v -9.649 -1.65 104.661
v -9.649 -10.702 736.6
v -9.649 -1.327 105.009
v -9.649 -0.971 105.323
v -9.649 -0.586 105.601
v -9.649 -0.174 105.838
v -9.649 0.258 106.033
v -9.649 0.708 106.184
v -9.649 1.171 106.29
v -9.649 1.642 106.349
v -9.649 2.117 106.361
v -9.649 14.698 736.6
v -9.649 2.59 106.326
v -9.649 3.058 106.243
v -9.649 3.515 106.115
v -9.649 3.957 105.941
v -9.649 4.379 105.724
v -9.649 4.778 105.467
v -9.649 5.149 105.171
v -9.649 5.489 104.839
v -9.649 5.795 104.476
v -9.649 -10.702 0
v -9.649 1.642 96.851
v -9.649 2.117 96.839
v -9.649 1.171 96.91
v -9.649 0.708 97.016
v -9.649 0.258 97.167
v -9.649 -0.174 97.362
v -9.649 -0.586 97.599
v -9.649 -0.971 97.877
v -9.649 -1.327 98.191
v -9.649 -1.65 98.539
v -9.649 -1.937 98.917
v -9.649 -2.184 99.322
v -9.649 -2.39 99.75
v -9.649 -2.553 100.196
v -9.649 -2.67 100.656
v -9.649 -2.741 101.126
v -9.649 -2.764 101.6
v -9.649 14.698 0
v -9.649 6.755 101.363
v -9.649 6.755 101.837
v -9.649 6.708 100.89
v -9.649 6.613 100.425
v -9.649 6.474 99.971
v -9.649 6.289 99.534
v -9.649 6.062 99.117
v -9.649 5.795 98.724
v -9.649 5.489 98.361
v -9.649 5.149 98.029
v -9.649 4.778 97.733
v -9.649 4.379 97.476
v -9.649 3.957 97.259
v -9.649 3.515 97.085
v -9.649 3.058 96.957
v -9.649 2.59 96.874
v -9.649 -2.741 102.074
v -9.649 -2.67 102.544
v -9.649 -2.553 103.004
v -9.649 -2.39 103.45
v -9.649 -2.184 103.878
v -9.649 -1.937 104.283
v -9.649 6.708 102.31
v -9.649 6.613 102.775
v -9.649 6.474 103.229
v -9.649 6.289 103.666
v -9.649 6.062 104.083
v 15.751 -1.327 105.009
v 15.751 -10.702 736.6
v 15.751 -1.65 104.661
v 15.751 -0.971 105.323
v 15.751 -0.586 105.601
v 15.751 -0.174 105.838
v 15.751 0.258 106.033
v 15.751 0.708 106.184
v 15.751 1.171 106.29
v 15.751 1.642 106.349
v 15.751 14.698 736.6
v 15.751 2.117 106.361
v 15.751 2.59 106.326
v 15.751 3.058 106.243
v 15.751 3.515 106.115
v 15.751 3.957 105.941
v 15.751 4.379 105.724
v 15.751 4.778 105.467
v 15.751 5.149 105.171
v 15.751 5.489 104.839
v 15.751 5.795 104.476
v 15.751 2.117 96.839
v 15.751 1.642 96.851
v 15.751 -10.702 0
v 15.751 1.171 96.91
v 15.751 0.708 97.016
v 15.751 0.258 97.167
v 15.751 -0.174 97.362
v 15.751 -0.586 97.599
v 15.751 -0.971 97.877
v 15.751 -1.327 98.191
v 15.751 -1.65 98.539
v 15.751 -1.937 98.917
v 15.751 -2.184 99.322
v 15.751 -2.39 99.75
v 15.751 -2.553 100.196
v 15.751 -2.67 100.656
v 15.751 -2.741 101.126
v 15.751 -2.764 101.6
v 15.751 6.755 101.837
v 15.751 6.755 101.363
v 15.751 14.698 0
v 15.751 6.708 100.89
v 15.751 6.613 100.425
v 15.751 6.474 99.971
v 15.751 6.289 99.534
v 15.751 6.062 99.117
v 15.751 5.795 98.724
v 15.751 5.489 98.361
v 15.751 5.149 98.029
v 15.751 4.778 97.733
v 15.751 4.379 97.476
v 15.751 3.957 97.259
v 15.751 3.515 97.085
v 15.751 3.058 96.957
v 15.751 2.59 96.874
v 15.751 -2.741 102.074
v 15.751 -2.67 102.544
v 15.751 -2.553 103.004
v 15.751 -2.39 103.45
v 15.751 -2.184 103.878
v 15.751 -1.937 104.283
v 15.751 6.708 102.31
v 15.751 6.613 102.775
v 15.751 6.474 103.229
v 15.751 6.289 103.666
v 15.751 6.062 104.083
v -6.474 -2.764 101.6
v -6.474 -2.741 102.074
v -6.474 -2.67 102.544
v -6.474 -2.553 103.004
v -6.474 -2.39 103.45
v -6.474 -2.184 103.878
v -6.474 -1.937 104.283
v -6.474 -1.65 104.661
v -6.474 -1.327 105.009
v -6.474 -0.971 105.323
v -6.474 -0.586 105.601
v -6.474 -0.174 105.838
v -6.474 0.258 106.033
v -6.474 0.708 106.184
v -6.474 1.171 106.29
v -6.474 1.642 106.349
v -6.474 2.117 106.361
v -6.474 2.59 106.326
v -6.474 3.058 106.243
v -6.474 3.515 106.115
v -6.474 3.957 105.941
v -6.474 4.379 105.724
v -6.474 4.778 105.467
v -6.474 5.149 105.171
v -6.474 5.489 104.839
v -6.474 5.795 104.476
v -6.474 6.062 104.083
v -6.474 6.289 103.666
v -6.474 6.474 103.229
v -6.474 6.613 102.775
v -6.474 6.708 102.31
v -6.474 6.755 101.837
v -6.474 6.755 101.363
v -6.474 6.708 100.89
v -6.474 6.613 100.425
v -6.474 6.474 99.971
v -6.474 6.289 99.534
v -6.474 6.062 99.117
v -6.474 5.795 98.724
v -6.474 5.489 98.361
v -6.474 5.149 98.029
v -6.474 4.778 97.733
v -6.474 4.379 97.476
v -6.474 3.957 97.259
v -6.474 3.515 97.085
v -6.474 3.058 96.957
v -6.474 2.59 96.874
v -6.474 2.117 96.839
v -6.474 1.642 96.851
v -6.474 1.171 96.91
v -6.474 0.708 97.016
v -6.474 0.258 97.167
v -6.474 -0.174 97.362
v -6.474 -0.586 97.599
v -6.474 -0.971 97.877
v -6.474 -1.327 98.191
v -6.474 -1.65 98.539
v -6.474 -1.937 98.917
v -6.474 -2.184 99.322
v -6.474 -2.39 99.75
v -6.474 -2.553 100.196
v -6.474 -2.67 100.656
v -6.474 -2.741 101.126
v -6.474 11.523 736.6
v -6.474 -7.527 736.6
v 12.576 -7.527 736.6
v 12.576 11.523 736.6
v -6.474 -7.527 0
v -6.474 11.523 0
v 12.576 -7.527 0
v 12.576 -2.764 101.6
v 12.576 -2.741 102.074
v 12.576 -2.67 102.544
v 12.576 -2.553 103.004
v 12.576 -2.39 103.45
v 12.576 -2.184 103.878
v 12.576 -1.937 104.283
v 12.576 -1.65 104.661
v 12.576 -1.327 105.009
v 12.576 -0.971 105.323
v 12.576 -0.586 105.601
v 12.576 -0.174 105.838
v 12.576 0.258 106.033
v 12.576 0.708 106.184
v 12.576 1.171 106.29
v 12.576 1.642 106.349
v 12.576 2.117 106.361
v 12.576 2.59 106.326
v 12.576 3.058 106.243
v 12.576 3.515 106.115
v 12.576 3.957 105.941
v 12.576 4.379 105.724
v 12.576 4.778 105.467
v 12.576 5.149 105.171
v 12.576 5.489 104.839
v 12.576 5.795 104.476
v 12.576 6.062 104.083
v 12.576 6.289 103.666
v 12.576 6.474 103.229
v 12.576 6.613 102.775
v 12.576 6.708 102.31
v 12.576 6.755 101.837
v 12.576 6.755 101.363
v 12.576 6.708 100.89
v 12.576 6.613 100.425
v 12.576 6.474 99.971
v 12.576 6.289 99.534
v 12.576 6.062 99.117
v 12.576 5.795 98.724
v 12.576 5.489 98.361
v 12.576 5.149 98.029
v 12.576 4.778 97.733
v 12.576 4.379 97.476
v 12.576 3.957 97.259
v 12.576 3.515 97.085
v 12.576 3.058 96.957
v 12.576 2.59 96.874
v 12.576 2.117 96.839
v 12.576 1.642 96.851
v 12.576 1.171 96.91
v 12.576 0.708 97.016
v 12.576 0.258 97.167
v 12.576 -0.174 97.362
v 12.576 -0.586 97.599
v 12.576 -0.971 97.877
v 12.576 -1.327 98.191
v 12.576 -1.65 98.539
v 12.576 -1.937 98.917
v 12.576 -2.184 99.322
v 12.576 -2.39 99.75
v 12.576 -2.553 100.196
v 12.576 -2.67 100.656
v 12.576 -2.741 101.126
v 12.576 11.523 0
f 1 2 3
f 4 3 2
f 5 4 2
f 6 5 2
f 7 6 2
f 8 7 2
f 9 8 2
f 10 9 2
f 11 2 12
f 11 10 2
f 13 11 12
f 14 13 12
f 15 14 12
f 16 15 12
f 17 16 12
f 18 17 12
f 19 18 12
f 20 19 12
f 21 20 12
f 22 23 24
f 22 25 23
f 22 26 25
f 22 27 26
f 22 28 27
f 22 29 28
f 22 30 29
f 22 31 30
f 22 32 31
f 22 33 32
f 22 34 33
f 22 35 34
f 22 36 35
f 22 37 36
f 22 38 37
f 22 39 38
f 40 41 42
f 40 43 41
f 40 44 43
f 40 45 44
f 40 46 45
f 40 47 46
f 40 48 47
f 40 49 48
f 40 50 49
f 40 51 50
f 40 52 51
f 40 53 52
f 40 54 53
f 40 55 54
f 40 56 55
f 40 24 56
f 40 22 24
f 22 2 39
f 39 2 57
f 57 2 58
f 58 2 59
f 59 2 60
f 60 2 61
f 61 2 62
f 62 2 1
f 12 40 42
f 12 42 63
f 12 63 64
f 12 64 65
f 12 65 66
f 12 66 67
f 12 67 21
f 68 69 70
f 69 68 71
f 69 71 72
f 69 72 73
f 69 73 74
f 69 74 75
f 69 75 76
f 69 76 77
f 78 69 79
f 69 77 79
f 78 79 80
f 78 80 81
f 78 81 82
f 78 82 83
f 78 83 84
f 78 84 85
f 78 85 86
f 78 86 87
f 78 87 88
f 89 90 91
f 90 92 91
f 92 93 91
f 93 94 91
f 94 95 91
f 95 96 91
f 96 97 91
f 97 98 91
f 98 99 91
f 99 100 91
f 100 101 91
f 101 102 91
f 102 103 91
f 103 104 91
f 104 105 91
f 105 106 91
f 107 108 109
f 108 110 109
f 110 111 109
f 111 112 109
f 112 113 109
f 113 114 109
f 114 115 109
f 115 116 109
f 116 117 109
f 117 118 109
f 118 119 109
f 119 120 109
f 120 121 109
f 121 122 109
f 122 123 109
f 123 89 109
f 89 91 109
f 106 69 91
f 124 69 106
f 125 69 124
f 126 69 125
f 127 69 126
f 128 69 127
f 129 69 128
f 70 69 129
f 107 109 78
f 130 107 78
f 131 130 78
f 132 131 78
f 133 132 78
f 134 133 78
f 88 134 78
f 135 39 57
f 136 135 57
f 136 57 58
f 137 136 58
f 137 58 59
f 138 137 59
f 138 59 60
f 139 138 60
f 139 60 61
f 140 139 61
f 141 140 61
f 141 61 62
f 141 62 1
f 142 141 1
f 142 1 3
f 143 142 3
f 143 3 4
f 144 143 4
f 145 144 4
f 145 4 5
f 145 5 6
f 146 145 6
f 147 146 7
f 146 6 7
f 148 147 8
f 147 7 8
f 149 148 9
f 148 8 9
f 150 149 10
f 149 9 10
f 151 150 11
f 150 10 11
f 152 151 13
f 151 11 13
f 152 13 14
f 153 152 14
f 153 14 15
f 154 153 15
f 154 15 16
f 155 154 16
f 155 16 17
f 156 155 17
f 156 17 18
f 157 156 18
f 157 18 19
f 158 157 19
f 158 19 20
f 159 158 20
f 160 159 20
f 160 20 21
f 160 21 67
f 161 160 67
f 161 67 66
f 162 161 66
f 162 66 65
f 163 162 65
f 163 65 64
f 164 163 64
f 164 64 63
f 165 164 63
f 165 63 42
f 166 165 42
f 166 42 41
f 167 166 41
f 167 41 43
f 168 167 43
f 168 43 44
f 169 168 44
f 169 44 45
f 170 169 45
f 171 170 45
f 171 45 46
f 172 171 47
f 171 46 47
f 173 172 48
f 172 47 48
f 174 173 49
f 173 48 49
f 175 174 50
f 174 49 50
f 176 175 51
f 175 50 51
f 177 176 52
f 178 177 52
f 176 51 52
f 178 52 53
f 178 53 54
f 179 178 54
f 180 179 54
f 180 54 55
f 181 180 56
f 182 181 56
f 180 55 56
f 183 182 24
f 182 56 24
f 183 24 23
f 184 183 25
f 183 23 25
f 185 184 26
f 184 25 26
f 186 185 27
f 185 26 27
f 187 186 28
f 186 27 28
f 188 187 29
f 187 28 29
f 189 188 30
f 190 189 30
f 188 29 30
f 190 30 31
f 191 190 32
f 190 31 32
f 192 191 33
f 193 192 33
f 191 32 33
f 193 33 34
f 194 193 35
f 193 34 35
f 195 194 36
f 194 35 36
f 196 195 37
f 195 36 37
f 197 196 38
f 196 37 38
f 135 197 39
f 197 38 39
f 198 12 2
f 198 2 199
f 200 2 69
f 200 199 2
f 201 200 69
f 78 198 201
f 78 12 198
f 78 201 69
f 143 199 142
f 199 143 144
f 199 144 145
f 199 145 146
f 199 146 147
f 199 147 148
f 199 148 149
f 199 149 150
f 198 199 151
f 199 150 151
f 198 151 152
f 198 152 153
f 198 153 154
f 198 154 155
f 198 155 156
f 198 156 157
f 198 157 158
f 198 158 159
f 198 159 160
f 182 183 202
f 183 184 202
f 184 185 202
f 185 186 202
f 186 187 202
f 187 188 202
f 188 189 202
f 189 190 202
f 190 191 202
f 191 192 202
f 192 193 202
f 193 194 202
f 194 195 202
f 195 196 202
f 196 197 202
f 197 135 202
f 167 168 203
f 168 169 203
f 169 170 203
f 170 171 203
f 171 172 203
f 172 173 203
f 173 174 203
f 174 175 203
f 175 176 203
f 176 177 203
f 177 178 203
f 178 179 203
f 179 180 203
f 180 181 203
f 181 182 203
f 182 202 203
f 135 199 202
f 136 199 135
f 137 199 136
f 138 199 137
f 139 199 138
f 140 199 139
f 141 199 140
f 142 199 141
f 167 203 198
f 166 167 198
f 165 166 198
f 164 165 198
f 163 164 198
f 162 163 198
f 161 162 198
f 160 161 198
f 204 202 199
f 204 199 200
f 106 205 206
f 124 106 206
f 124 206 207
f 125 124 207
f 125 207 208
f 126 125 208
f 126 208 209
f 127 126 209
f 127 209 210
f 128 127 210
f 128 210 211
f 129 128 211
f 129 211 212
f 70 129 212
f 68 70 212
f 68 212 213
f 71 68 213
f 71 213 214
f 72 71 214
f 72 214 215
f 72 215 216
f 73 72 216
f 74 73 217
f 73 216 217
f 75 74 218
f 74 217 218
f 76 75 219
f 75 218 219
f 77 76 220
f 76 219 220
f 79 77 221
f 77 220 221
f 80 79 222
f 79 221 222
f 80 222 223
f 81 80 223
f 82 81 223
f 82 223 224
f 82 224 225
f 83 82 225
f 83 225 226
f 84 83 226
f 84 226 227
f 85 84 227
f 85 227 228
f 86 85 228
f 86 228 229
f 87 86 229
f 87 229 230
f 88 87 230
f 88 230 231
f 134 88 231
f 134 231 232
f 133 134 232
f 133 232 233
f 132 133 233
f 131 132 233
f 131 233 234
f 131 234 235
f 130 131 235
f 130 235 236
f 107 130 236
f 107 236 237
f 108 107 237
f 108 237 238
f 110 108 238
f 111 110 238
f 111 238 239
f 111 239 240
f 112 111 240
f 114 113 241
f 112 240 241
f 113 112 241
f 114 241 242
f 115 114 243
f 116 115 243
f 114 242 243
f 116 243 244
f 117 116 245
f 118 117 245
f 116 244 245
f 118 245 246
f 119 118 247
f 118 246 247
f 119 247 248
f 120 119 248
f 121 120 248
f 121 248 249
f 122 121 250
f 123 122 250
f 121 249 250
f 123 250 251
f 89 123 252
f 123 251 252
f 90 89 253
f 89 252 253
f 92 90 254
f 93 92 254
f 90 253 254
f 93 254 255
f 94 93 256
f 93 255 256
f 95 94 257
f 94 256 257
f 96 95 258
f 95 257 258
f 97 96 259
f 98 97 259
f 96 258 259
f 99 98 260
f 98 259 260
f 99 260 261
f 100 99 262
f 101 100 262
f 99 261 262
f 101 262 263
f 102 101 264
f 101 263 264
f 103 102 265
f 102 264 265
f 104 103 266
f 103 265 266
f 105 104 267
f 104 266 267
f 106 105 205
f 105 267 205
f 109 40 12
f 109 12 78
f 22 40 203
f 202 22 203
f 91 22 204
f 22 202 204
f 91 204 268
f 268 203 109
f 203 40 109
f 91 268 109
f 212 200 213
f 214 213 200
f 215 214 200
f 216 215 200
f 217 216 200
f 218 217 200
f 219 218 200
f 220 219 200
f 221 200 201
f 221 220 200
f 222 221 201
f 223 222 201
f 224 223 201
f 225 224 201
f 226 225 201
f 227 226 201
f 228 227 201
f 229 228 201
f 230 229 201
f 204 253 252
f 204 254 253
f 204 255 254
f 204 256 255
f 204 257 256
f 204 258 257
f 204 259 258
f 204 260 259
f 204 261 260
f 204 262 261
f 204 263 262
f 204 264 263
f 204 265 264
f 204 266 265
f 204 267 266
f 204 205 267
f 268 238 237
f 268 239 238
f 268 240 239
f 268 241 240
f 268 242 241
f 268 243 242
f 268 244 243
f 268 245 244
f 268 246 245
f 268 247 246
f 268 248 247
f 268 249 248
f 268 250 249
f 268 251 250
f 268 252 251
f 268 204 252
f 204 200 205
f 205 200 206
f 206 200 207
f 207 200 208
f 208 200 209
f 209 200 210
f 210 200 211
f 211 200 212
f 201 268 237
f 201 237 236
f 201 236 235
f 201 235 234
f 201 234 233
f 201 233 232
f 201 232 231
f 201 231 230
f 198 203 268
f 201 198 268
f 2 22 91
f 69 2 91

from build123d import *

# Parameters (mm, degrees)
SKETCH1_W           = 25.4
SKETCH1_H           = 25.4
SKETCH1_W_2         = 19.05
SKETCH1_H_2         = 19.05
BOSS_EXTRUDE1_DEPTH = 736.6
SKETCH3_R           = 4.7625
CUT_EXTRUDE1_DEPTH  = 127


with BuildPart() as part:
    # Sketch1 → Boss-Extrude1 (new body)
    with BuildSketch(Plane.XY):
        with Locations((3.05078858, 1.998217396)):
            Rectangle(SKETCH1_W, SKETCH1_H)
        with Locations((3.05078858, 1.998217396)):
            Rectangle(SKETCH1_W_2, SKETCH1_H_2, mode=Mode.SUBTRACT)
    extrude(amount=BOSS_EXTRUDE1_DEPTH)

    # Sketch3 → Cut-Extrude1 (cut)
    with BuildSketch(Plane.ZY.offset(9.64921142)):
        with Locations(Location((101.6, 1.998217396, 0), (0, 0, 270))):
            Circle(SKETCH3_R)
    extrude(amount=-CUT_EXTRUDE1_DEPTH, mode=Mode.SUBTRACT)


solid = part.part
